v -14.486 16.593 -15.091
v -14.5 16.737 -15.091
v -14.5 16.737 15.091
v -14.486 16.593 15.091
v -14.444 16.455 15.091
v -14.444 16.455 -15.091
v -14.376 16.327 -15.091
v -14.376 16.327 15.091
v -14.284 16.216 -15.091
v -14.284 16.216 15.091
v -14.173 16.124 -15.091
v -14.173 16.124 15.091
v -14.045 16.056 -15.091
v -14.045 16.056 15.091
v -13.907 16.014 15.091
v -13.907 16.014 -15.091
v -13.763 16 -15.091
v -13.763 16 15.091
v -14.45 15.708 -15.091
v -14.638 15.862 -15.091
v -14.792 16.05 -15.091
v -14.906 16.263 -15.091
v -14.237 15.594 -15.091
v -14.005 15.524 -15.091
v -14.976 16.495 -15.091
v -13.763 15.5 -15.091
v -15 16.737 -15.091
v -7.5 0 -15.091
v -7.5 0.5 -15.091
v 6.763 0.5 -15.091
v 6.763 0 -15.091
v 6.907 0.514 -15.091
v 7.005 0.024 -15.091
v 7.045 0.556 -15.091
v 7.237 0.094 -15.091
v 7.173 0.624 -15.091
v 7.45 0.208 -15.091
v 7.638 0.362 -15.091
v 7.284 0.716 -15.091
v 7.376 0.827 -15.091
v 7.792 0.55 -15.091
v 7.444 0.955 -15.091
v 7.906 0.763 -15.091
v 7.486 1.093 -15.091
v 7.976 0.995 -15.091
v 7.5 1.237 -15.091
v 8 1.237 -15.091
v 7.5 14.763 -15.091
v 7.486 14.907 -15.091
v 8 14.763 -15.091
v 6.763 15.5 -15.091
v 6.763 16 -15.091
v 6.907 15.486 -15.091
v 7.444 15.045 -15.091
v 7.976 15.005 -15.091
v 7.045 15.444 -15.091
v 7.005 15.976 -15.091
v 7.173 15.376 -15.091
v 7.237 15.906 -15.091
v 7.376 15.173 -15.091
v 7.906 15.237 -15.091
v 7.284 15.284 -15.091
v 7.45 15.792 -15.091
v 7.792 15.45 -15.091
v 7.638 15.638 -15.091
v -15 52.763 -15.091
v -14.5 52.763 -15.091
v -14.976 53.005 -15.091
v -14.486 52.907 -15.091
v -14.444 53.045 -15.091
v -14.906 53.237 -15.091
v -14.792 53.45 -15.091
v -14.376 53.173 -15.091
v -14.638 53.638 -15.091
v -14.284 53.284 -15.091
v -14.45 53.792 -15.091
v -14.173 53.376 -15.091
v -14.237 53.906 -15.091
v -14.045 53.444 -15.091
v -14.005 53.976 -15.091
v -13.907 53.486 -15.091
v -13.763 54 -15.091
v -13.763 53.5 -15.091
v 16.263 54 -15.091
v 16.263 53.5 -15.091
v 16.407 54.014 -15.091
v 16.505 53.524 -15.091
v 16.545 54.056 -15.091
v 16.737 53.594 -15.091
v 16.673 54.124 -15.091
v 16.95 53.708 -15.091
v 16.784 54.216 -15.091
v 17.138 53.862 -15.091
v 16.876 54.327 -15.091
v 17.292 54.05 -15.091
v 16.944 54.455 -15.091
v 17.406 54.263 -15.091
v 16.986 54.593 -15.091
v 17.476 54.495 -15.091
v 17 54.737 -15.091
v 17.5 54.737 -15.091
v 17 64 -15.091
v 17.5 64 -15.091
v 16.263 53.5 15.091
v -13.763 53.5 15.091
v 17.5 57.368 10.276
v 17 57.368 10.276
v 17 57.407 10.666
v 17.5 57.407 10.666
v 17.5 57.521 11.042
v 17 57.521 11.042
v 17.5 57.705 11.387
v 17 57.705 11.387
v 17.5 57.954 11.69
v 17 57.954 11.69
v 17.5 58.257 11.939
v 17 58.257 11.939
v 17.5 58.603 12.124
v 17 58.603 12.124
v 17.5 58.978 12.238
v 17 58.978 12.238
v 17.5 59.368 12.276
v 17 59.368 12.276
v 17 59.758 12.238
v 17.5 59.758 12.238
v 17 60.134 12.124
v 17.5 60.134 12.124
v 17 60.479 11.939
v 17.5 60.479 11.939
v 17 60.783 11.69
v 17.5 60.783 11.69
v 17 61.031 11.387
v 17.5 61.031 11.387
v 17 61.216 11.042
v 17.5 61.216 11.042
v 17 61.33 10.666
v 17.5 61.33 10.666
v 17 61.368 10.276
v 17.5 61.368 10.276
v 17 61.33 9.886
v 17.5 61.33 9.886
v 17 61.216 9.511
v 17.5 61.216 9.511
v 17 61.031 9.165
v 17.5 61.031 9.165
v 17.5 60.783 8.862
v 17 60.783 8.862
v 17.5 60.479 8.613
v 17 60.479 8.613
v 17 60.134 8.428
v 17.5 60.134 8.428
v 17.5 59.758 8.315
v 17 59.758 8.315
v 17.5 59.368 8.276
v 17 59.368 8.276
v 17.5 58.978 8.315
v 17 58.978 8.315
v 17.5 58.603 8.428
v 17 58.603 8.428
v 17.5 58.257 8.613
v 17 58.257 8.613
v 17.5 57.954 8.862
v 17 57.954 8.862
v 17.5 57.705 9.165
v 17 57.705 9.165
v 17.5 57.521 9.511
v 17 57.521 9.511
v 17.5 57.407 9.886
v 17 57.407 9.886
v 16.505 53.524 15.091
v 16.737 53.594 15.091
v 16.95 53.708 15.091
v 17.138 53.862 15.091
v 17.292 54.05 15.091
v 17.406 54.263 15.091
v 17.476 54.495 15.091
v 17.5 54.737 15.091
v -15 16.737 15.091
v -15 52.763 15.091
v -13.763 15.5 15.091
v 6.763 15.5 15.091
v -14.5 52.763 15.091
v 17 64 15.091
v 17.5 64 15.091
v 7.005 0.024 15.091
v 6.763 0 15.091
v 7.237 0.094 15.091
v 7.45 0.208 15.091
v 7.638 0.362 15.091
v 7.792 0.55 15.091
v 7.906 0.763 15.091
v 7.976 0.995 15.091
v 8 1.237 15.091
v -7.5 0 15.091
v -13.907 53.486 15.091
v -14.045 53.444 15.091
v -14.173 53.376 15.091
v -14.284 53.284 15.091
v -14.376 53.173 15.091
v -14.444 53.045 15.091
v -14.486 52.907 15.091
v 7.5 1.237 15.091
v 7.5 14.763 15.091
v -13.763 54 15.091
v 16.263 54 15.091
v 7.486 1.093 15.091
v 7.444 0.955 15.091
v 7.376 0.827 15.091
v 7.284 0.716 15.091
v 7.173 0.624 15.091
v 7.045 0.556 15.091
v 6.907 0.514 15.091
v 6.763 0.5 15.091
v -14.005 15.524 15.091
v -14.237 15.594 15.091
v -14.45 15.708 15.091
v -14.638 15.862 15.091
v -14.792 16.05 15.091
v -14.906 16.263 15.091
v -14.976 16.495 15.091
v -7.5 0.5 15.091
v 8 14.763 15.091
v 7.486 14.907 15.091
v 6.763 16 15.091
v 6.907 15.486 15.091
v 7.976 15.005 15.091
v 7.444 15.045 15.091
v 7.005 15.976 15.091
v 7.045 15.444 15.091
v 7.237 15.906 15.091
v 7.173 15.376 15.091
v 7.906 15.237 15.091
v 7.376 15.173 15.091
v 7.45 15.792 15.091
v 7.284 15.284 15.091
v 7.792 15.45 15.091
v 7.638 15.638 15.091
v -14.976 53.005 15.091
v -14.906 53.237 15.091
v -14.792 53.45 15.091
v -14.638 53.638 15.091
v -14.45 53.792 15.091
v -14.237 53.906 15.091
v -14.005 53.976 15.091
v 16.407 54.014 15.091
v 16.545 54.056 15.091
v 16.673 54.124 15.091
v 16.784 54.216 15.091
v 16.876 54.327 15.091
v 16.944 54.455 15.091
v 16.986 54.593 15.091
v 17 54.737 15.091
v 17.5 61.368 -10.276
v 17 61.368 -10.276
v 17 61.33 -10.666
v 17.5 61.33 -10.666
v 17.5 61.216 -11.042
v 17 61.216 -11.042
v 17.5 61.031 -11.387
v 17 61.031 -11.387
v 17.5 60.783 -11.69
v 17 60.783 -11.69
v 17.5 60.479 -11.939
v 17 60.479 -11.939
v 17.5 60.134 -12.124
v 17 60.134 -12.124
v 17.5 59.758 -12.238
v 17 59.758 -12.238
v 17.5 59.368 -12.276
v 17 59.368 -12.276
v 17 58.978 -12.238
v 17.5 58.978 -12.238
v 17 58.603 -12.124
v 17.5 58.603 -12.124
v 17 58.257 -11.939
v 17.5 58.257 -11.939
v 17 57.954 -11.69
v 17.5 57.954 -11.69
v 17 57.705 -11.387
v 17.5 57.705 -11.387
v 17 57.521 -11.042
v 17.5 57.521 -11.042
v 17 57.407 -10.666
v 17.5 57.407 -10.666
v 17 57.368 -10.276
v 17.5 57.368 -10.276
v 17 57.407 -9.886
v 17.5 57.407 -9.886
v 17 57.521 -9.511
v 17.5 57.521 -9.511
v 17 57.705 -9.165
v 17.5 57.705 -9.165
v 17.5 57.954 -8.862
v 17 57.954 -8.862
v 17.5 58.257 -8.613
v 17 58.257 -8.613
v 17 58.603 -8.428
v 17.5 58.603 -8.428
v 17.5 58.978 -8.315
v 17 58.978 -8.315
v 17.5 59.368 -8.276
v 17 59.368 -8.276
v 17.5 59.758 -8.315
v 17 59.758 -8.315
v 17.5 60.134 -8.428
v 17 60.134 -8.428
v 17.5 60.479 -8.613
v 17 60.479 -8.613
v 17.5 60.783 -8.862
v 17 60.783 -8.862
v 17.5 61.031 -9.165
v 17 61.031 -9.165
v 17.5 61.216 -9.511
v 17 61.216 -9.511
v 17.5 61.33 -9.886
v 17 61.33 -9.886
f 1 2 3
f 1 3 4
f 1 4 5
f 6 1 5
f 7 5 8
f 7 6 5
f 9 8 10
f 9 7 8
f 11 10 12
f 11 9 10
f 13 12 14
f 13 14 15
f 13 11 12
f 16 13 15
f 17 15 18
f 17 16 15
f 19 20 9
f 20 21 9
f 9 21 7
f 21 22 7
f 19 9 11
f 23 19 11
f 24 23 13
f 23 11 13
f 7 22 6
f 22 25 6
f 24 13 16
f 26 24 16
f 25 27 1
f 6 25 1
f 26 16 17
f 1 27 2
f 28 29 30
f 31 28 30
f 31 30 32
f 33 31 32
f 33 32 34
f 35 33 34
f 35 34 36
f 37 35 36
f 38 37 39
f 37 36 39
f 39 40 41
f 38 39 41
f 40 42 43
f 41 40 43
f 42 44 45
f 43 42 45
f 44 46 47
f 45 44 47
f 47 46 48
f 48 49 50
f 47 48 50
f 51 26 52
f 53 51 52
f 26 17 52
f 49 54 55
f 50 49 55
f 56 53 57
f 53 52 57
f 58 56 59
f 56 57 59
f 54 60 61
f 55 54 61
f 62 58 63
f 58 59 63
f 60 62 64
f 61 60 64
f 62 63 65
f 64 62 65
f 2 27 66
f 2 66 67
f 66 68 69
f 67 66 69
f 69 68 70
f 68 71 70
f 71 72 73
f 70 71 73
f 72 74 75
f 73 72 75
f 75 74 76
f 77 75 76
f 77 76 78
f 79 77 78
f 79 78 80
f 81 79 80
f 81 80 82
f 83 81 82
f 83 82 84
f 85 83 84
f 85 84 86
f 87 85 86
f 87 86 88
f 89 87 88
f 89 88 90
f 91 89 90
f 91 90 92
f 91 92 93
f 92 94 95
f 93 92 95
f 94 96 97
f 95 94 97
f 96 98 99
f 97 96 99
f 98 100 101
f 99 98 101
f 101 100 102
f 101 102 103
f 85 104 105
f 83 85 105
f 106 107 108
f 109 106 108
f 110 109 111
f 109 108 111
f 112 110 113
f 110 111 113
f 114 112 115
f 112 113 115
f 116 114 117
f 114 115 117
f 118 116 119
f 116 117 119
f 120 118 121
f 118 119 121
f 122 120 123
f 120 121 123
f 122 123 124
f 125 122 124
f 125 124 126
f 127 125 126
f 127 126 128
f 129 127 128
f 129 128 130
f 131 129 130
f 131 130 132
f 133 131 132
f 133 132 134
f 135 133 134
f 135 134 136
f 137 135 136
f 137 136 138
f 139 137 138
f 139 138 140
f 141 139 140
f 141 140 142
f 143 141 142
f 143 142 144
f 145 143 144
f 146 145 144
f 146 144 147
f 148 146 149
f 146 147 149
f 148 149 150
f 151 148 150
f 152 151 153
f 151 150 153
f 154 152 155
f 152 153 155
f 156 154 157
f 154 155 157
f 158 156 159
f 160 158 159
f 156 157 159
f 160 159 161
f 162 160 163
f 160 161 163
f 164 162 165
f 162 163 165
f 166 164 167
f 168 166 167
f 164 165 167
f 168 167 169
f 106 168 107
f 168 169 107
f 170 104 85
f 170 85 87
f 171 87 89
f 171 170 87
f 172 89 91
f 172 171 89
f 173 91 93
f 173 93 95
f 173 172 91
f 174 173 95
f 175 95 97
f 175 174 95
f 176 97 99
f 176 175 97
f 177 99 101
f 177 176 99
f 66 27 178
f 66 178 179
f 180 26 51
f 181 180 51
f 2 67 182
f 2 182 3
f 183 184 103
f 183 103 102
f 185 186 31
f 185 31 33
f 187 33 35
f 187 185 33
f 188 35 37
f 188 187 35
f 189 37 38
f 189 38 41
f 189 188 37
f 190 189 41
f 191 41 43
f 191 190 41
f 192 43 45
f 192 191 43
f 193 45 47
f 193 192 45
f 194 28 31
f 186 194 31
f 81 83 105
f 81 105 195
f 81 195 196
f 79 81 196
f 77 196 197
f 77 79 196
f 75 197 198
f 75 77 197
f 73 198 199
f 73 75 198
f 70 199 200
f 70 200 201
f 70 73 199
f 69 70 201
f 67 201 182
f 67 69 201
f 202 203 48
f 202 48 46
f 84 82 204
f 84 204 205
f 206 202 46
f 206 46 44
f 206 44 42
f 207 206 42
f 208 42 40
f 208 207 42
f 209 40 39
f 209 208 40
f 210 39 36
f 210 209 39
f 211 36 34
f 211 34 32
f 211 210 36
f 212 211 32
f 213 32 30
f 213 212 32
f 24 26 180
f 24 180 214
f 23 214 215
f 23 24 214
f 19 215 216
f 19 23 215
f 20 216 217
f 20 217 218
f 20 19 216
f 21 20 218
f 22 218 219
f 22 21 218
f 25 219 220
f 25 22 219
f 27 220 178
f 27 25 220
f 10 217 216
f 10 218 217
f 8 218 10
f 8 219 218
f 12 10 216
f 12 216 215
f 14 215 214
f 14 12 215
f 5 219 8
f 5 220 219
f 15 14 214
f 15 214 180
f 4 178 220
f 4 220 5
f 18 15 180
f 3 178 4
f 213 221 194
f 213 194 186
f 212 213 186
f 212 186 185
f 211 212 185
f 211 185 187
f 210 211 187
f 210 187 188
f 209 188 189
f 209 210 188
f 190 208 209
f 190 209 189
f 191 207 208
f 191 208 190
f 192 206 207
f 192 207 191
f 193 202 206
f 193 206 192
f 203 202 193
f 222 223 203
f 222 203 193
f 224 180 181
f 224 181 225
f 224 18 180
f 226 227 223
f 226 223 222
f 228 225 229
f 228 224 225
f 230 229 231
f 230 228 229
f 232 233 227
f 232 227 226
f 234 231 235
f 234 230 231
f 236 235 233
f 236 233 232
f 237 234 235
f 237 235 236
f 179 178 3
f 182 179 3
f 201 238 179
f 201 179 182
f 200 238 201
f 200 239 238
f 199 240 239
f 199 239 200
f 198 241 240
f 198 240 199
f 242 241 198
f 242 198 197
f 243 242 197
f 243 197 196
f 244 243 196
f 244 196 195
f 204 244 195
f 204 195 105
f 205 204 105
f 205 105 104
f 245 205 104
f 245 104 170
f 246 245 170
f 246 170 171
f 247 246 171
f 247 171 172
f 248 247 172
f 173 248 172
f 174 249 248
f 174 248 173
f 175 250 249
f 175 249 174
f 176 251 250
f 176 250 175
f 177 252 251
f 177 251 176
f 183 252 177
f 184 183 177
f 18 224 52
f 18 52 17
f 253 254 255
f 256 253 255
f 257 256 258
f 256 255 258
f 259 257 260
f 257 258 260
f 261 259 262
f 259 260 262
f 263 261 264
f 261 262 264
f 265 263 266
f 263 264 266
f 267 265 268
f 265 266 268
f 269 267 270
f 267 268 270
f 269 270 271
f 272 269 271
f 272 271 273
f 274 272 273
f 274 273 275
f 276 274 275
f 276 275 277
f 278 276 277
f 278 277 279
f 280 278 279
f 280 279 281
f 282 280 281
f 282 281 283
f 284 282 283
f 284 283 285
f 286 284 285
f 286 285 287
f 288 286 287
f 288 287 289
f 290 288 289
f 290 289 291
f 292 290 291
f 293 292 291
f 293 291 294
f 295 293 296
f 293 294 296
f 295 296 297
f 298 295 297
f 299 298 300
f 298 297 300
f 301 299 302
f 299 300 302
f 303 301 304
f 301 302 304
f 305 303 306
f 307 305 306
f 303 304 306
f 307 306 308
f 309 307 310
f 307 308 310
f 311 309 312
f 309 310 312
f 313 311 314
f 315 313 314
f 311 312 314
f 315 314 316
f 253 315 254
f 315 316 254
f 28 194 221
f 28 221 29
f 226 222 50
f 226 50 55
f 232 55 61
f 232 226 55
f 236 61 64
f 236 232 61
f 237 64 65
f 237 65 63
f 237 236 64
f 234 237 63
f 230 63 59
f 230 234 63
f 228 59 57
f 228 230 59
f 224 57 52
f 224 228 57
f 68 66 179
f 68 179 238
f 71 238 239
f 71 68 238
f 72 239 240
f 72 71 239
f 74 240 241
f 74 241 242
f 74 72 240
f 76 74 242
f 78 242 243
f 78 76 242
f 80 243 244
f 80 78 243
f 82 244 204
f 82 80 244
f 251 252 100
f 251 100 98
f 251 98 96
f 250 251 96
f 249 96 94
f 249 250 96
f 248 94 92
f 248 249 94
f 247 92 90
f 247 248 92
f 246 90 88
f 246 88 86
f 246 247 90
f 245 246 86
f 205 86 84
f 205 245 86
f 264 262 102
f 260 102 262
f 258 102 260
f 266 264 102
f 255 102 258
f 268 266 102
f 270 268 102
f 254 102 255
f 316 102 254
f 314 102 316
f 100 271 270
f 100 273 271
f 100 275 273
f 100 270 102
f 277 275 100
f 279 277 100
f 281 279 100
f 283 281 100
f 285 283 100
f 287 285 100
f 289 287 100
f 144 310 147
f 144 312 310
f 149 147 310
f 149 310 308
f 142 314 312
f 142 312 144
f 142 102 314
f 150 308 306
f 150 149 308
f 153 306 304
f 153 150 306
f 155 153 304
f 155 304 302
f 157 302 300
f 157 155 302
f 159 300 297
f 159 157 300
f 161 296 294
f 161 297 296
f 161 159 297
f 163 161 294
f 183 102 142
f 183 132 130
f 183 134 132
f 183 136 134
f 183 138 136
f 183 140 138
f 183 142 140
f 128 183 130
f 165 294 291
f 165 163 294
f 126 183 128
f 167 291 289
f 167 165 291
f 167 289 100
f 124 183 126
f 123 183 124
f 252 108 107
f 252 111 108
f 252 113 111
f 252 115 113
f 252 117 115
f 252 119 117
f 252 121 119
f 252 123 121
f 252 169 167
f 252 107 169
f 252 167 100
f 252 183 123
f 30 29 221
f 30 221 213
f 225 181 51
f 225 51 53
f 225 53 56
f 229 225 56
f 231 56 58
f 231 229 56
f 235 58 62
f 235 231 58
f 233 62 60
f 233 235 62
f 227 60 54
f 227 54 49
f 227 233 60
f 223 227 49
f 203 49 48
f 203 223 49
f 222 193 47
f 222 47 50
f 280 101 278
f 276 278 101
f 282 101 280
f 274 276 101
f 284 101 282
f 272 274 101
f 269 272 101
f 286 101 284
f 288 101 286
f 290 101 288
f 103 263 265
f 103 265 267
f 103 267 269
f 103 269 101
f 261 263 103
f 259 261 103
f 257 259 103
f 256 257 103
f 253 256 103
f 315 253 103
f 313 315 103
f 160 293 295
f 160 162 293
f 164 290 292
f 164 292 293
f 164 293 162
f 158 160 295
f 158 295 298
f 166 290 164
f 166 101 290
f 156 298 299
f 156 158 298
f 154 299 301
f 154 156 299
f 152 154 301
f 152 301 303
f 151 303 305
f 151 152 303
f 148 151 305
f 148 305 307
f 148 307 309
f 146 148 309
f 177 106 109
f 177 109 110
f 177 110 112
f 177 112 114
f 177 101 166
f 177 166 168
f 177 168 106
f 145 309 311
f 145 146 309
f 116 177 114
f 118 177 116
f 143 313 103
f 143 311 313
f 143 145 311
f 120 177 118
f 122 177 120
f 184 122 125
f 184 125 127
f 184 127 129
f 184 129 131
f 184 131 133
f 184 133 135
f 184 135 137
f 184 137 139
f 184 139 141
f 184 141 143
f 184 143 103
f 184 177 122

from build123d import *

# Parameters (mm, degrees)
SKETCH1_W                    = 15
SKETCH1_H                    = 30.181487224
BASE_FLANGE2_DEPTH           = 0.5
EDGE_FLANGE1_STRIP_W         = 3.4732
EDGE_FLANGE1_STRIP_H         = 0.5
EDGE_FLANGE1_STRIP_CUT_DEPTH = 30.181487223
EDGE_FLANGE1_DEPTH           = 30.181487223
EDGE_FLANGE2_STRIP_W         = 3.4732
EDGE_FLANGE2_STRIP_H         = 0.5
EDGE_FLANGE2_STRIP_CUT_DEPTH = 30.181487223
EDGE_FLANGE2_DEPTH           = 30.181487223
EDGE_FLANGE6_STRIP_W         = 3.4732
EDGE_FLANGE6_STRIP_H         = 0.5
EDGE_FLANGE6_STRIP_CUT_DEPTH = 30.181487223
EDGE_FLANGE6_DEPTH           = 30.181487223
EDGE_FLANGE7_STRIP_W         = 3.4732
EDGE_FLANGE7_STRIP_H         = 0.5
EDGE_FLANGE7_STRIP_CUT_DEPTH = 30.181487223
EDGE_FLANGE7_DEPTH           = 30.181487223
EDGE_FLANGE8_STRIP_W         = 3.4732
EDGE_FLANGE8_STRIP_H         = 0.5
EDGE_FLANGE8_STRIP_CUT_DEPTH = 30.181487223
EDGE_FLANGE8_DEPTH           = 30.181487223
SKETCH58_R                   = 2
CUT_EXTRUDE1_DEPTH           = 74.128178856


# Sheet-metal steps are written as plain solids
with BuildPart() as part:
    # Sketch1 → Base-Flange2 (new body)
    with BuildSketch(Plane(origin=(0, 0, 0), x_dir=(1, 0, 0), z_dir=(0, 1, 0))):
        Rectangle(SKETCH1_W, SKETCH1_H)
    extrude(amount=BASE_FLANGE2_DEPTH)

    # Edge-Flange1 strip (across the edge) → Edge-Flange1 strip cut (cut)
    with BuildSketch(Plane(origin=(7.5, 0.5, 15.090743612), x_dir=(-1, 0, 0), z_dir=(0, 0, -1))):
        with Locations((-1, -0.25)):
            Rectangle(EDGE_FLANGE1_STRIP_W, EDGE_FLANGE1_STRIP_H)
    extrude(amount=EDGE_FLANGE1_STRIP_CUT_DEPTH, mode=Mode.SUBTRACT)

    # Edge-Flange1 section (across the edge) → Edge-Flange1 (add)
    with BuildSketch(Plane(origin=(7.5, 0.5, 15.090743612), x_dir=(-1, 0, 0), z_dir=(0, 0, -1))):
        with BuildLine():
            Line((-0.5, 0.7366), (-0.5, 15))
            Line((-0.5, 15), (0, 15))
            Line((0, 15), (0, 0.7366))
            ThreePointArc((0, 0.7366), (0.215745145, 0.215745145), (0.7366, 0))
            Line((0.7366, 0), (0.7366, -0.5))
            ThreePointArc((0.7366, -0.5), (-0.137808246, -0.137808246), (-0.5, 0.7366))
        make_face()
    extrude(amount=EDGE_FLANGE1_DEPTH)

    # Edge-Flange2 strip (across the edge) → Edge-Flange2 strip cut (cut)
    with BuildSketch(Plane(origin=(7.5, 15.5, 15.090743612), x_dir=(0, -1, 0), z_dir=(0, 0, -1))):
        with Locations((-1, -0.25)):
            Rectangle(EDGE_FLANGE2_STRIP_W, EDGE_FLANGE2_STRIP_H)
    extrude(amount=EDGE_FLANGE2_STRIP_CUT_DEPTH, mode=Mode.SUBTRACT)

    # Edge-Flange2 section (across the edge) → Edge-Flange2 (add)
    with BuildSketch(Plane(origin=(7.5, 15.5, 15.090743612), x_dir=(0, -1, 0), z_dir=(0, 0, -1))):
        with BuildLine():
            Line((-0.5, 0.7366), (-0.5, 22))
            Line((-0.5, 22), (0, 22))
            Line((0, 22), (0, 0.7366))
            ThreePointArc((0, 0.7366), (0.215745145, 0.215745145), (0.7366, 0))
            Line((0.7366, 0), (0.7366, -0.5))
            ThreePointArc((0.7366, -0.5), (-0.137808246, -0.137808246), (-0.5, 0.7366))
        make_face()
    extrude(amount=EDGE_FLANGE2_DEPTH)

    # Edge-Flange6 strip (across the edge) → Edge-Flange6 strip cut (cut)
    with BuildSketch(Plane(origin=(-14.5, 16, -15.090743612), x_dir=(1, 0, 0), z_dir=(0, 0, 1))):
        with Locations((-1, -0.25)):
            Rectangle(EDGE_FLANGE6_STRIP_W, EDGE_FLANGE6_STRIP_H)
    extrude(amount=EDGE_FLANGE6_STRIP_CUT_DEPTH, mode=Mode.SUBTRACT)

    # Edge-Flange6 section (across the edge) → Edge-Flange6 (add)
    with BuildSketch(Plane(origin=(-14.5, 16, -15.090743612), x_dir=(1, 0, 0), z_dir=(0, 0, 1))):
        with BuildLine():
            Line((-0.5, 0.7366), (-0.5, 37.5))
            Line((-0.5, 37.5), (0, 37.5))
            Line((0, 37.5), (0, 0.7366))
            ThreePointArc((0, 0.7366), (0.215745145, 0.215745145), (0.7366, 0))
            Line((0.7366, 0), (0.7366, -0.5))
            ThreePointArc((0.7366, -0.5), (-0.137808246, -0.137808246), (-0.5, 0.7366))
        make_face()
    extrude(amount=EDGE_FLANGE6_DEPTH)

    # Edge-Flange7 strip (across the edge) → Edge-Flange7 strip cut (cut)
    with BuildSketch(Plane(origin=(-14.5, 53.5, -15.090743612), x_dir=(0, -1, 0), z_dir=(0, 0, 1))):
        with Locations((-1, -0.25)):
            Rectangle(EDGE_FLANGE7_STRIP_W, EDGE_FLANGE7_STRIP_H)
    extrude(amount=EDGE_FLANGE7_STRIP_CUT_DEPTH, mode=Mode.SUBTRACT)

    # Edge-Flange7 section (across the edge) → Edge-Flange7 (add)
    with BuildSketch(Plane(origin=(-14.5, 53.5, -15.090743612), x_dir=(0, -1, 0), z_dir=(0, 0, 1))):
        with BuildLine():
            Line((-0.5, 0.7366), (-0.5, 31.5))
            Line((-0.5, 31.5), (0, 31.5))
            Line((0, 31.5), (0, 0.7366))
            ThreePointArc((0, 0.7366), (0.215745145, 0.215745145), (0.7366, 0))
            Line((0.7366, 0), (0.7366, -0.5))
            ThreePointArc((0.7366, -0.5), (-0.137808246, -0.137808246), (-0.5, 0.7366))
        make_face()
    extrude(amount=EDGE_FLANGE7_DEPTH)

    # Edge-Flange8 strip (across the edge) → Edge-Flange8 strip cut (cut)
    with BuildSketch(Plane(origin=(17, 54, 15.090743612), x_dir=(-1, 0, 0), z_dir=(0, 0, -1))):
        with Locations((-1, -0.25)):
            Rectangle(EDGE_FLANGE8_STRIP_W, EDGE_FLANGE8_STRIP_H)
    extrude(amount=EDGE_FLANGE8_STRIP_CUT_DEPTH, mode=Mode.SUBTRACT)

    # Edge-Flange8 section (across the edge) → Edge-Flange8 (add)
    with BuildSketch(Plane(origin=(17, 54, 15.090743612), x_dir=(-1, 0, 0), z_dir=(0, 0, -1))):
        with BuildLine():
            Line((-0.5, 0.7366), (-0.5, 10))
            Line((-0.5, 10), (0, 10))
            Line((0, 10), (0, 0.7366))
            ThreePointArc((0, 0.7366), (0.215745145, 0.215745145), (0.7366, 0))
            Line((0.7366, 0), (0.7366, -0.5))
            ThreePointArc((0.7366, -0.5), (-0.137808246, -0.137808246), (-0.5, 0.7366))
        make_face()
    extrude(amount=EDGE_FLANGE8_DEPTH)

    # Sketch58 → Cut-Extrude1 (cut, through all)
    with BuildSketch(Plane.ZY.offset(-17)):
        with Locations(Location((10.276185244, 59.3683, 0), (0, 0, 270))):
            Circle(SKETCH58_R)
        with Locations(Location((-10.276185244, 59.3683, 0), (0, 0, 90))):
            Circle(SKETCH58_R)
    extrude(amount=-CUT_EXTRUDE1_DEPTH, mode=Mode.SUBTRACT)


solid = part.part
